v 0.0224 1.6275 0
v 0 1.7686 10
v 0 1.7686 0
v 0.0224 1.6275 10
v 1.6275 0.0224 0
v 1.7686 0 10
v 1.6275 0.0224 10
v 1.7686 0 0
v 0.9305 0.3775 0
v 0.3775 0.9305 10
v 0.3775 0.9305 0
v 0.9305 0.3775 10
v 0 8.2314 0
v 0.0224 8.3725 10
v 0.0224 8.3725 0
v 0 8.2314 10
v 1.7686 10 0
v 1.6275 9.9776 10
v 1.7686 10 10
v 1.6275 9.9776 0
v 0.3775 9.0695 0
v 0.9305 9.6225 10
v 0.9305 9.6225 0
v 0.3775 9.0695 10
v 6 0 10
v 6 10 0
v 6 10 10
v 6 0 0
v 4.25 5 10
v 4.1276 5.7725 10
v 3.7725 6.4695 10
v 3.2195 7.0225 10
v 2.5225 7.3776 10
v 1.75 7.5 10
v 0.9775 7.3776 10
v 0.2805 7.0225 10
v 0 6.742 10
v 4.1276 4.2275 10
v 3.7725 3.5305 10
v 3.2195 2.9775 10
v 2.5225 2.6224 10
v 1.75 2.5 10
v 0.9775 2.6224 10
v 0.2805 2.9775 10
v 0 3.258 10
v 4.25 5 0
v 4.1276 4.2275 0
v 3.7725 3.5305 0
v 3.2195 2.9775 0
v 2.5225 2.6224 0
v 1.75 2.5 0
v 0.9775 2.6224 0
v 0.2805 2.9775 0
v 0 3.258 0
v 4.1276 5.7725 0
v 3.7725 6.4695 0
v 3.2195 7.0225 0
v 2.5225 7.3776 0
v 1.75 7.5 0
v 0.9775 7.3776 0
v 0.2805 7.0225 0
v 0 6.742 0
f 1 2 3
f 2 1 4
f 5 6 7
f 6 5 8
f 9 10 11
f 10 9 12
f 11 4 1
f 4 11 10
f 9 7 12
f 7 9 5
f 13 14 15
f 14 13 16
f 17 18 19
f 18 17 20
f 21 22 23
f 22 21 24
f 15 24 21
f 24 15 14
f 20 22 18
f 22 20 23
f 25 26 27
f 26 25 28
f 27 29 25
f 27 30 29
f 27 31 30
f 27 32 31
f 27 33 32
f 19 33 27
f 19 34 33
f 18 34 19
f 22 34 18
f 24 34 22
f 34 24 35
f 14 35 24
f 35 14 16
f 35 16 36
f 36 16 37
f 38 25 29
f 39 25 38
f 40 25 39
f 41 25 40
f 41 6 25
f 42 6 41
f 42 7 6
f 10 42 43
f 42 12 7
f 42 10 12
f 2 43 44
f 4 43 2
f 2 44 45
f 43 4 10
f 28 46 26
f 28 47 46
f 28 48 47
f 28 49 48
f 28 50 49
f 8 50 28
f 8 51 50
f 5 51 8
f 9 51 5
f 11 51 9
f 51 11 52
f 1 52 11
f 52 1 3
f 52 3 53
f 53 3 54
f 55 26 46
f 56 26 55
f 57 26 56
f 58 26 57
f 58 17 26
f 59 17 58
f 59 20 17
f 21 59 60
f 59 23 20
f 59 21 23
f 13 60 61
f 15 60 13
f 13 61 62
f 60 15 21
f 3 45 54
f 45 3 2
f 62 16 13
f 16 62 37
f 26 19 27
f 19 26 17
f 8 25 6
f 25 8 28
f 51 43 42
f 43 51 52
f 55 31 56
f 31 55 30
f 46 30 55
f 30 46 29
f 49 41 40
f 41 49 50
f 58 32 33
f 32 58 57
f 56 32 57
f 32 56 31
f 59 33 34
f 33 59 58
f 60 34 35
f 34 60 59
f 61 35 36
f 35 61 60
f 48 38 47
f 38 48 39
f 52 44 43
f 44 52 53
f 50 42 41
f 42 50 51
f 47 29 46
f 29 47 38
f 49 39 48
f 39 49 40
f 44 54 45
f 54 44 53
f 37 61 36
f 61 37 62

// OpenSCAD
// Parametric Cord Guide
// by Ming-Dao Chia

// Use with double sided tape or other sticking mechanism.
// Adjust base width and length, if using with pre-cut
// wall mounting strips.

// *Settings*

// Base width (perpendicular to cord)
// Must be wider than cord
base_width = 10; // in mm

// Base length (parallel to cord)
base_length = 10; // in mm

// Cord diameter (make a bit bigger than the actual cord)
cord_diameter = 5; // in mm

// *Advanced settings*

// Cable holding fraction
// e.g. at 50%, half the cable will be in the slot
cable_holding = 0.15; // fraction (0.5 = 50%)

// Circle resolution (if round bits aren't round enough, increase this)
circle_res = 20; // number of sides of cylinder

// Top rounding offset (more=rounder, must be greater than 0)
top_round_dist = 0.1; // in mm

// end settings

// cube core
module PCG_core(){
    cube([cord_diameter*1.2, base_width, base_length]);
}

// center bit to hold cable
module PCG_center(){
    cylinder(h=base_length+2,r=cord_diameter/2, $fn=circle_res);
}

// rounds off corners
module PCG_corner_smooth(){
    difference(){
        cube([cord_diameter,cord_diameter,base_length+2]);
        translate([cord_diameter/2,cord_diameter/2,-1])
        cylinder(h=base_length+4,r=cord_diameter/2, $fn=circle_res);
        translate([-1,cord_diameter/2,-1])
        cube([cord_diameter+2,cord_diameter,base_length+4]);
        translate([cord_diameter/2,-1,-1])
        cube([cord_diameter,cord_diameter+2,base_length+4]);
    }
}

// bring everything together
module PCordGuide(){
    difference(){
        PCG_core();
        translate([cord_diameter/2-cord_diameter*cable_holding,base_width/2,-1])
        PCG_center();
        translate([-top_round_dist,-top_round_dist,-1])
        PCG_corner_smooth();
        mirror([0,1,0])
        translate([-top_round_dist,-(base_width+top_round_dist),-1])
        PCG_corner_smooth();
    }
}

PCordGuide();
